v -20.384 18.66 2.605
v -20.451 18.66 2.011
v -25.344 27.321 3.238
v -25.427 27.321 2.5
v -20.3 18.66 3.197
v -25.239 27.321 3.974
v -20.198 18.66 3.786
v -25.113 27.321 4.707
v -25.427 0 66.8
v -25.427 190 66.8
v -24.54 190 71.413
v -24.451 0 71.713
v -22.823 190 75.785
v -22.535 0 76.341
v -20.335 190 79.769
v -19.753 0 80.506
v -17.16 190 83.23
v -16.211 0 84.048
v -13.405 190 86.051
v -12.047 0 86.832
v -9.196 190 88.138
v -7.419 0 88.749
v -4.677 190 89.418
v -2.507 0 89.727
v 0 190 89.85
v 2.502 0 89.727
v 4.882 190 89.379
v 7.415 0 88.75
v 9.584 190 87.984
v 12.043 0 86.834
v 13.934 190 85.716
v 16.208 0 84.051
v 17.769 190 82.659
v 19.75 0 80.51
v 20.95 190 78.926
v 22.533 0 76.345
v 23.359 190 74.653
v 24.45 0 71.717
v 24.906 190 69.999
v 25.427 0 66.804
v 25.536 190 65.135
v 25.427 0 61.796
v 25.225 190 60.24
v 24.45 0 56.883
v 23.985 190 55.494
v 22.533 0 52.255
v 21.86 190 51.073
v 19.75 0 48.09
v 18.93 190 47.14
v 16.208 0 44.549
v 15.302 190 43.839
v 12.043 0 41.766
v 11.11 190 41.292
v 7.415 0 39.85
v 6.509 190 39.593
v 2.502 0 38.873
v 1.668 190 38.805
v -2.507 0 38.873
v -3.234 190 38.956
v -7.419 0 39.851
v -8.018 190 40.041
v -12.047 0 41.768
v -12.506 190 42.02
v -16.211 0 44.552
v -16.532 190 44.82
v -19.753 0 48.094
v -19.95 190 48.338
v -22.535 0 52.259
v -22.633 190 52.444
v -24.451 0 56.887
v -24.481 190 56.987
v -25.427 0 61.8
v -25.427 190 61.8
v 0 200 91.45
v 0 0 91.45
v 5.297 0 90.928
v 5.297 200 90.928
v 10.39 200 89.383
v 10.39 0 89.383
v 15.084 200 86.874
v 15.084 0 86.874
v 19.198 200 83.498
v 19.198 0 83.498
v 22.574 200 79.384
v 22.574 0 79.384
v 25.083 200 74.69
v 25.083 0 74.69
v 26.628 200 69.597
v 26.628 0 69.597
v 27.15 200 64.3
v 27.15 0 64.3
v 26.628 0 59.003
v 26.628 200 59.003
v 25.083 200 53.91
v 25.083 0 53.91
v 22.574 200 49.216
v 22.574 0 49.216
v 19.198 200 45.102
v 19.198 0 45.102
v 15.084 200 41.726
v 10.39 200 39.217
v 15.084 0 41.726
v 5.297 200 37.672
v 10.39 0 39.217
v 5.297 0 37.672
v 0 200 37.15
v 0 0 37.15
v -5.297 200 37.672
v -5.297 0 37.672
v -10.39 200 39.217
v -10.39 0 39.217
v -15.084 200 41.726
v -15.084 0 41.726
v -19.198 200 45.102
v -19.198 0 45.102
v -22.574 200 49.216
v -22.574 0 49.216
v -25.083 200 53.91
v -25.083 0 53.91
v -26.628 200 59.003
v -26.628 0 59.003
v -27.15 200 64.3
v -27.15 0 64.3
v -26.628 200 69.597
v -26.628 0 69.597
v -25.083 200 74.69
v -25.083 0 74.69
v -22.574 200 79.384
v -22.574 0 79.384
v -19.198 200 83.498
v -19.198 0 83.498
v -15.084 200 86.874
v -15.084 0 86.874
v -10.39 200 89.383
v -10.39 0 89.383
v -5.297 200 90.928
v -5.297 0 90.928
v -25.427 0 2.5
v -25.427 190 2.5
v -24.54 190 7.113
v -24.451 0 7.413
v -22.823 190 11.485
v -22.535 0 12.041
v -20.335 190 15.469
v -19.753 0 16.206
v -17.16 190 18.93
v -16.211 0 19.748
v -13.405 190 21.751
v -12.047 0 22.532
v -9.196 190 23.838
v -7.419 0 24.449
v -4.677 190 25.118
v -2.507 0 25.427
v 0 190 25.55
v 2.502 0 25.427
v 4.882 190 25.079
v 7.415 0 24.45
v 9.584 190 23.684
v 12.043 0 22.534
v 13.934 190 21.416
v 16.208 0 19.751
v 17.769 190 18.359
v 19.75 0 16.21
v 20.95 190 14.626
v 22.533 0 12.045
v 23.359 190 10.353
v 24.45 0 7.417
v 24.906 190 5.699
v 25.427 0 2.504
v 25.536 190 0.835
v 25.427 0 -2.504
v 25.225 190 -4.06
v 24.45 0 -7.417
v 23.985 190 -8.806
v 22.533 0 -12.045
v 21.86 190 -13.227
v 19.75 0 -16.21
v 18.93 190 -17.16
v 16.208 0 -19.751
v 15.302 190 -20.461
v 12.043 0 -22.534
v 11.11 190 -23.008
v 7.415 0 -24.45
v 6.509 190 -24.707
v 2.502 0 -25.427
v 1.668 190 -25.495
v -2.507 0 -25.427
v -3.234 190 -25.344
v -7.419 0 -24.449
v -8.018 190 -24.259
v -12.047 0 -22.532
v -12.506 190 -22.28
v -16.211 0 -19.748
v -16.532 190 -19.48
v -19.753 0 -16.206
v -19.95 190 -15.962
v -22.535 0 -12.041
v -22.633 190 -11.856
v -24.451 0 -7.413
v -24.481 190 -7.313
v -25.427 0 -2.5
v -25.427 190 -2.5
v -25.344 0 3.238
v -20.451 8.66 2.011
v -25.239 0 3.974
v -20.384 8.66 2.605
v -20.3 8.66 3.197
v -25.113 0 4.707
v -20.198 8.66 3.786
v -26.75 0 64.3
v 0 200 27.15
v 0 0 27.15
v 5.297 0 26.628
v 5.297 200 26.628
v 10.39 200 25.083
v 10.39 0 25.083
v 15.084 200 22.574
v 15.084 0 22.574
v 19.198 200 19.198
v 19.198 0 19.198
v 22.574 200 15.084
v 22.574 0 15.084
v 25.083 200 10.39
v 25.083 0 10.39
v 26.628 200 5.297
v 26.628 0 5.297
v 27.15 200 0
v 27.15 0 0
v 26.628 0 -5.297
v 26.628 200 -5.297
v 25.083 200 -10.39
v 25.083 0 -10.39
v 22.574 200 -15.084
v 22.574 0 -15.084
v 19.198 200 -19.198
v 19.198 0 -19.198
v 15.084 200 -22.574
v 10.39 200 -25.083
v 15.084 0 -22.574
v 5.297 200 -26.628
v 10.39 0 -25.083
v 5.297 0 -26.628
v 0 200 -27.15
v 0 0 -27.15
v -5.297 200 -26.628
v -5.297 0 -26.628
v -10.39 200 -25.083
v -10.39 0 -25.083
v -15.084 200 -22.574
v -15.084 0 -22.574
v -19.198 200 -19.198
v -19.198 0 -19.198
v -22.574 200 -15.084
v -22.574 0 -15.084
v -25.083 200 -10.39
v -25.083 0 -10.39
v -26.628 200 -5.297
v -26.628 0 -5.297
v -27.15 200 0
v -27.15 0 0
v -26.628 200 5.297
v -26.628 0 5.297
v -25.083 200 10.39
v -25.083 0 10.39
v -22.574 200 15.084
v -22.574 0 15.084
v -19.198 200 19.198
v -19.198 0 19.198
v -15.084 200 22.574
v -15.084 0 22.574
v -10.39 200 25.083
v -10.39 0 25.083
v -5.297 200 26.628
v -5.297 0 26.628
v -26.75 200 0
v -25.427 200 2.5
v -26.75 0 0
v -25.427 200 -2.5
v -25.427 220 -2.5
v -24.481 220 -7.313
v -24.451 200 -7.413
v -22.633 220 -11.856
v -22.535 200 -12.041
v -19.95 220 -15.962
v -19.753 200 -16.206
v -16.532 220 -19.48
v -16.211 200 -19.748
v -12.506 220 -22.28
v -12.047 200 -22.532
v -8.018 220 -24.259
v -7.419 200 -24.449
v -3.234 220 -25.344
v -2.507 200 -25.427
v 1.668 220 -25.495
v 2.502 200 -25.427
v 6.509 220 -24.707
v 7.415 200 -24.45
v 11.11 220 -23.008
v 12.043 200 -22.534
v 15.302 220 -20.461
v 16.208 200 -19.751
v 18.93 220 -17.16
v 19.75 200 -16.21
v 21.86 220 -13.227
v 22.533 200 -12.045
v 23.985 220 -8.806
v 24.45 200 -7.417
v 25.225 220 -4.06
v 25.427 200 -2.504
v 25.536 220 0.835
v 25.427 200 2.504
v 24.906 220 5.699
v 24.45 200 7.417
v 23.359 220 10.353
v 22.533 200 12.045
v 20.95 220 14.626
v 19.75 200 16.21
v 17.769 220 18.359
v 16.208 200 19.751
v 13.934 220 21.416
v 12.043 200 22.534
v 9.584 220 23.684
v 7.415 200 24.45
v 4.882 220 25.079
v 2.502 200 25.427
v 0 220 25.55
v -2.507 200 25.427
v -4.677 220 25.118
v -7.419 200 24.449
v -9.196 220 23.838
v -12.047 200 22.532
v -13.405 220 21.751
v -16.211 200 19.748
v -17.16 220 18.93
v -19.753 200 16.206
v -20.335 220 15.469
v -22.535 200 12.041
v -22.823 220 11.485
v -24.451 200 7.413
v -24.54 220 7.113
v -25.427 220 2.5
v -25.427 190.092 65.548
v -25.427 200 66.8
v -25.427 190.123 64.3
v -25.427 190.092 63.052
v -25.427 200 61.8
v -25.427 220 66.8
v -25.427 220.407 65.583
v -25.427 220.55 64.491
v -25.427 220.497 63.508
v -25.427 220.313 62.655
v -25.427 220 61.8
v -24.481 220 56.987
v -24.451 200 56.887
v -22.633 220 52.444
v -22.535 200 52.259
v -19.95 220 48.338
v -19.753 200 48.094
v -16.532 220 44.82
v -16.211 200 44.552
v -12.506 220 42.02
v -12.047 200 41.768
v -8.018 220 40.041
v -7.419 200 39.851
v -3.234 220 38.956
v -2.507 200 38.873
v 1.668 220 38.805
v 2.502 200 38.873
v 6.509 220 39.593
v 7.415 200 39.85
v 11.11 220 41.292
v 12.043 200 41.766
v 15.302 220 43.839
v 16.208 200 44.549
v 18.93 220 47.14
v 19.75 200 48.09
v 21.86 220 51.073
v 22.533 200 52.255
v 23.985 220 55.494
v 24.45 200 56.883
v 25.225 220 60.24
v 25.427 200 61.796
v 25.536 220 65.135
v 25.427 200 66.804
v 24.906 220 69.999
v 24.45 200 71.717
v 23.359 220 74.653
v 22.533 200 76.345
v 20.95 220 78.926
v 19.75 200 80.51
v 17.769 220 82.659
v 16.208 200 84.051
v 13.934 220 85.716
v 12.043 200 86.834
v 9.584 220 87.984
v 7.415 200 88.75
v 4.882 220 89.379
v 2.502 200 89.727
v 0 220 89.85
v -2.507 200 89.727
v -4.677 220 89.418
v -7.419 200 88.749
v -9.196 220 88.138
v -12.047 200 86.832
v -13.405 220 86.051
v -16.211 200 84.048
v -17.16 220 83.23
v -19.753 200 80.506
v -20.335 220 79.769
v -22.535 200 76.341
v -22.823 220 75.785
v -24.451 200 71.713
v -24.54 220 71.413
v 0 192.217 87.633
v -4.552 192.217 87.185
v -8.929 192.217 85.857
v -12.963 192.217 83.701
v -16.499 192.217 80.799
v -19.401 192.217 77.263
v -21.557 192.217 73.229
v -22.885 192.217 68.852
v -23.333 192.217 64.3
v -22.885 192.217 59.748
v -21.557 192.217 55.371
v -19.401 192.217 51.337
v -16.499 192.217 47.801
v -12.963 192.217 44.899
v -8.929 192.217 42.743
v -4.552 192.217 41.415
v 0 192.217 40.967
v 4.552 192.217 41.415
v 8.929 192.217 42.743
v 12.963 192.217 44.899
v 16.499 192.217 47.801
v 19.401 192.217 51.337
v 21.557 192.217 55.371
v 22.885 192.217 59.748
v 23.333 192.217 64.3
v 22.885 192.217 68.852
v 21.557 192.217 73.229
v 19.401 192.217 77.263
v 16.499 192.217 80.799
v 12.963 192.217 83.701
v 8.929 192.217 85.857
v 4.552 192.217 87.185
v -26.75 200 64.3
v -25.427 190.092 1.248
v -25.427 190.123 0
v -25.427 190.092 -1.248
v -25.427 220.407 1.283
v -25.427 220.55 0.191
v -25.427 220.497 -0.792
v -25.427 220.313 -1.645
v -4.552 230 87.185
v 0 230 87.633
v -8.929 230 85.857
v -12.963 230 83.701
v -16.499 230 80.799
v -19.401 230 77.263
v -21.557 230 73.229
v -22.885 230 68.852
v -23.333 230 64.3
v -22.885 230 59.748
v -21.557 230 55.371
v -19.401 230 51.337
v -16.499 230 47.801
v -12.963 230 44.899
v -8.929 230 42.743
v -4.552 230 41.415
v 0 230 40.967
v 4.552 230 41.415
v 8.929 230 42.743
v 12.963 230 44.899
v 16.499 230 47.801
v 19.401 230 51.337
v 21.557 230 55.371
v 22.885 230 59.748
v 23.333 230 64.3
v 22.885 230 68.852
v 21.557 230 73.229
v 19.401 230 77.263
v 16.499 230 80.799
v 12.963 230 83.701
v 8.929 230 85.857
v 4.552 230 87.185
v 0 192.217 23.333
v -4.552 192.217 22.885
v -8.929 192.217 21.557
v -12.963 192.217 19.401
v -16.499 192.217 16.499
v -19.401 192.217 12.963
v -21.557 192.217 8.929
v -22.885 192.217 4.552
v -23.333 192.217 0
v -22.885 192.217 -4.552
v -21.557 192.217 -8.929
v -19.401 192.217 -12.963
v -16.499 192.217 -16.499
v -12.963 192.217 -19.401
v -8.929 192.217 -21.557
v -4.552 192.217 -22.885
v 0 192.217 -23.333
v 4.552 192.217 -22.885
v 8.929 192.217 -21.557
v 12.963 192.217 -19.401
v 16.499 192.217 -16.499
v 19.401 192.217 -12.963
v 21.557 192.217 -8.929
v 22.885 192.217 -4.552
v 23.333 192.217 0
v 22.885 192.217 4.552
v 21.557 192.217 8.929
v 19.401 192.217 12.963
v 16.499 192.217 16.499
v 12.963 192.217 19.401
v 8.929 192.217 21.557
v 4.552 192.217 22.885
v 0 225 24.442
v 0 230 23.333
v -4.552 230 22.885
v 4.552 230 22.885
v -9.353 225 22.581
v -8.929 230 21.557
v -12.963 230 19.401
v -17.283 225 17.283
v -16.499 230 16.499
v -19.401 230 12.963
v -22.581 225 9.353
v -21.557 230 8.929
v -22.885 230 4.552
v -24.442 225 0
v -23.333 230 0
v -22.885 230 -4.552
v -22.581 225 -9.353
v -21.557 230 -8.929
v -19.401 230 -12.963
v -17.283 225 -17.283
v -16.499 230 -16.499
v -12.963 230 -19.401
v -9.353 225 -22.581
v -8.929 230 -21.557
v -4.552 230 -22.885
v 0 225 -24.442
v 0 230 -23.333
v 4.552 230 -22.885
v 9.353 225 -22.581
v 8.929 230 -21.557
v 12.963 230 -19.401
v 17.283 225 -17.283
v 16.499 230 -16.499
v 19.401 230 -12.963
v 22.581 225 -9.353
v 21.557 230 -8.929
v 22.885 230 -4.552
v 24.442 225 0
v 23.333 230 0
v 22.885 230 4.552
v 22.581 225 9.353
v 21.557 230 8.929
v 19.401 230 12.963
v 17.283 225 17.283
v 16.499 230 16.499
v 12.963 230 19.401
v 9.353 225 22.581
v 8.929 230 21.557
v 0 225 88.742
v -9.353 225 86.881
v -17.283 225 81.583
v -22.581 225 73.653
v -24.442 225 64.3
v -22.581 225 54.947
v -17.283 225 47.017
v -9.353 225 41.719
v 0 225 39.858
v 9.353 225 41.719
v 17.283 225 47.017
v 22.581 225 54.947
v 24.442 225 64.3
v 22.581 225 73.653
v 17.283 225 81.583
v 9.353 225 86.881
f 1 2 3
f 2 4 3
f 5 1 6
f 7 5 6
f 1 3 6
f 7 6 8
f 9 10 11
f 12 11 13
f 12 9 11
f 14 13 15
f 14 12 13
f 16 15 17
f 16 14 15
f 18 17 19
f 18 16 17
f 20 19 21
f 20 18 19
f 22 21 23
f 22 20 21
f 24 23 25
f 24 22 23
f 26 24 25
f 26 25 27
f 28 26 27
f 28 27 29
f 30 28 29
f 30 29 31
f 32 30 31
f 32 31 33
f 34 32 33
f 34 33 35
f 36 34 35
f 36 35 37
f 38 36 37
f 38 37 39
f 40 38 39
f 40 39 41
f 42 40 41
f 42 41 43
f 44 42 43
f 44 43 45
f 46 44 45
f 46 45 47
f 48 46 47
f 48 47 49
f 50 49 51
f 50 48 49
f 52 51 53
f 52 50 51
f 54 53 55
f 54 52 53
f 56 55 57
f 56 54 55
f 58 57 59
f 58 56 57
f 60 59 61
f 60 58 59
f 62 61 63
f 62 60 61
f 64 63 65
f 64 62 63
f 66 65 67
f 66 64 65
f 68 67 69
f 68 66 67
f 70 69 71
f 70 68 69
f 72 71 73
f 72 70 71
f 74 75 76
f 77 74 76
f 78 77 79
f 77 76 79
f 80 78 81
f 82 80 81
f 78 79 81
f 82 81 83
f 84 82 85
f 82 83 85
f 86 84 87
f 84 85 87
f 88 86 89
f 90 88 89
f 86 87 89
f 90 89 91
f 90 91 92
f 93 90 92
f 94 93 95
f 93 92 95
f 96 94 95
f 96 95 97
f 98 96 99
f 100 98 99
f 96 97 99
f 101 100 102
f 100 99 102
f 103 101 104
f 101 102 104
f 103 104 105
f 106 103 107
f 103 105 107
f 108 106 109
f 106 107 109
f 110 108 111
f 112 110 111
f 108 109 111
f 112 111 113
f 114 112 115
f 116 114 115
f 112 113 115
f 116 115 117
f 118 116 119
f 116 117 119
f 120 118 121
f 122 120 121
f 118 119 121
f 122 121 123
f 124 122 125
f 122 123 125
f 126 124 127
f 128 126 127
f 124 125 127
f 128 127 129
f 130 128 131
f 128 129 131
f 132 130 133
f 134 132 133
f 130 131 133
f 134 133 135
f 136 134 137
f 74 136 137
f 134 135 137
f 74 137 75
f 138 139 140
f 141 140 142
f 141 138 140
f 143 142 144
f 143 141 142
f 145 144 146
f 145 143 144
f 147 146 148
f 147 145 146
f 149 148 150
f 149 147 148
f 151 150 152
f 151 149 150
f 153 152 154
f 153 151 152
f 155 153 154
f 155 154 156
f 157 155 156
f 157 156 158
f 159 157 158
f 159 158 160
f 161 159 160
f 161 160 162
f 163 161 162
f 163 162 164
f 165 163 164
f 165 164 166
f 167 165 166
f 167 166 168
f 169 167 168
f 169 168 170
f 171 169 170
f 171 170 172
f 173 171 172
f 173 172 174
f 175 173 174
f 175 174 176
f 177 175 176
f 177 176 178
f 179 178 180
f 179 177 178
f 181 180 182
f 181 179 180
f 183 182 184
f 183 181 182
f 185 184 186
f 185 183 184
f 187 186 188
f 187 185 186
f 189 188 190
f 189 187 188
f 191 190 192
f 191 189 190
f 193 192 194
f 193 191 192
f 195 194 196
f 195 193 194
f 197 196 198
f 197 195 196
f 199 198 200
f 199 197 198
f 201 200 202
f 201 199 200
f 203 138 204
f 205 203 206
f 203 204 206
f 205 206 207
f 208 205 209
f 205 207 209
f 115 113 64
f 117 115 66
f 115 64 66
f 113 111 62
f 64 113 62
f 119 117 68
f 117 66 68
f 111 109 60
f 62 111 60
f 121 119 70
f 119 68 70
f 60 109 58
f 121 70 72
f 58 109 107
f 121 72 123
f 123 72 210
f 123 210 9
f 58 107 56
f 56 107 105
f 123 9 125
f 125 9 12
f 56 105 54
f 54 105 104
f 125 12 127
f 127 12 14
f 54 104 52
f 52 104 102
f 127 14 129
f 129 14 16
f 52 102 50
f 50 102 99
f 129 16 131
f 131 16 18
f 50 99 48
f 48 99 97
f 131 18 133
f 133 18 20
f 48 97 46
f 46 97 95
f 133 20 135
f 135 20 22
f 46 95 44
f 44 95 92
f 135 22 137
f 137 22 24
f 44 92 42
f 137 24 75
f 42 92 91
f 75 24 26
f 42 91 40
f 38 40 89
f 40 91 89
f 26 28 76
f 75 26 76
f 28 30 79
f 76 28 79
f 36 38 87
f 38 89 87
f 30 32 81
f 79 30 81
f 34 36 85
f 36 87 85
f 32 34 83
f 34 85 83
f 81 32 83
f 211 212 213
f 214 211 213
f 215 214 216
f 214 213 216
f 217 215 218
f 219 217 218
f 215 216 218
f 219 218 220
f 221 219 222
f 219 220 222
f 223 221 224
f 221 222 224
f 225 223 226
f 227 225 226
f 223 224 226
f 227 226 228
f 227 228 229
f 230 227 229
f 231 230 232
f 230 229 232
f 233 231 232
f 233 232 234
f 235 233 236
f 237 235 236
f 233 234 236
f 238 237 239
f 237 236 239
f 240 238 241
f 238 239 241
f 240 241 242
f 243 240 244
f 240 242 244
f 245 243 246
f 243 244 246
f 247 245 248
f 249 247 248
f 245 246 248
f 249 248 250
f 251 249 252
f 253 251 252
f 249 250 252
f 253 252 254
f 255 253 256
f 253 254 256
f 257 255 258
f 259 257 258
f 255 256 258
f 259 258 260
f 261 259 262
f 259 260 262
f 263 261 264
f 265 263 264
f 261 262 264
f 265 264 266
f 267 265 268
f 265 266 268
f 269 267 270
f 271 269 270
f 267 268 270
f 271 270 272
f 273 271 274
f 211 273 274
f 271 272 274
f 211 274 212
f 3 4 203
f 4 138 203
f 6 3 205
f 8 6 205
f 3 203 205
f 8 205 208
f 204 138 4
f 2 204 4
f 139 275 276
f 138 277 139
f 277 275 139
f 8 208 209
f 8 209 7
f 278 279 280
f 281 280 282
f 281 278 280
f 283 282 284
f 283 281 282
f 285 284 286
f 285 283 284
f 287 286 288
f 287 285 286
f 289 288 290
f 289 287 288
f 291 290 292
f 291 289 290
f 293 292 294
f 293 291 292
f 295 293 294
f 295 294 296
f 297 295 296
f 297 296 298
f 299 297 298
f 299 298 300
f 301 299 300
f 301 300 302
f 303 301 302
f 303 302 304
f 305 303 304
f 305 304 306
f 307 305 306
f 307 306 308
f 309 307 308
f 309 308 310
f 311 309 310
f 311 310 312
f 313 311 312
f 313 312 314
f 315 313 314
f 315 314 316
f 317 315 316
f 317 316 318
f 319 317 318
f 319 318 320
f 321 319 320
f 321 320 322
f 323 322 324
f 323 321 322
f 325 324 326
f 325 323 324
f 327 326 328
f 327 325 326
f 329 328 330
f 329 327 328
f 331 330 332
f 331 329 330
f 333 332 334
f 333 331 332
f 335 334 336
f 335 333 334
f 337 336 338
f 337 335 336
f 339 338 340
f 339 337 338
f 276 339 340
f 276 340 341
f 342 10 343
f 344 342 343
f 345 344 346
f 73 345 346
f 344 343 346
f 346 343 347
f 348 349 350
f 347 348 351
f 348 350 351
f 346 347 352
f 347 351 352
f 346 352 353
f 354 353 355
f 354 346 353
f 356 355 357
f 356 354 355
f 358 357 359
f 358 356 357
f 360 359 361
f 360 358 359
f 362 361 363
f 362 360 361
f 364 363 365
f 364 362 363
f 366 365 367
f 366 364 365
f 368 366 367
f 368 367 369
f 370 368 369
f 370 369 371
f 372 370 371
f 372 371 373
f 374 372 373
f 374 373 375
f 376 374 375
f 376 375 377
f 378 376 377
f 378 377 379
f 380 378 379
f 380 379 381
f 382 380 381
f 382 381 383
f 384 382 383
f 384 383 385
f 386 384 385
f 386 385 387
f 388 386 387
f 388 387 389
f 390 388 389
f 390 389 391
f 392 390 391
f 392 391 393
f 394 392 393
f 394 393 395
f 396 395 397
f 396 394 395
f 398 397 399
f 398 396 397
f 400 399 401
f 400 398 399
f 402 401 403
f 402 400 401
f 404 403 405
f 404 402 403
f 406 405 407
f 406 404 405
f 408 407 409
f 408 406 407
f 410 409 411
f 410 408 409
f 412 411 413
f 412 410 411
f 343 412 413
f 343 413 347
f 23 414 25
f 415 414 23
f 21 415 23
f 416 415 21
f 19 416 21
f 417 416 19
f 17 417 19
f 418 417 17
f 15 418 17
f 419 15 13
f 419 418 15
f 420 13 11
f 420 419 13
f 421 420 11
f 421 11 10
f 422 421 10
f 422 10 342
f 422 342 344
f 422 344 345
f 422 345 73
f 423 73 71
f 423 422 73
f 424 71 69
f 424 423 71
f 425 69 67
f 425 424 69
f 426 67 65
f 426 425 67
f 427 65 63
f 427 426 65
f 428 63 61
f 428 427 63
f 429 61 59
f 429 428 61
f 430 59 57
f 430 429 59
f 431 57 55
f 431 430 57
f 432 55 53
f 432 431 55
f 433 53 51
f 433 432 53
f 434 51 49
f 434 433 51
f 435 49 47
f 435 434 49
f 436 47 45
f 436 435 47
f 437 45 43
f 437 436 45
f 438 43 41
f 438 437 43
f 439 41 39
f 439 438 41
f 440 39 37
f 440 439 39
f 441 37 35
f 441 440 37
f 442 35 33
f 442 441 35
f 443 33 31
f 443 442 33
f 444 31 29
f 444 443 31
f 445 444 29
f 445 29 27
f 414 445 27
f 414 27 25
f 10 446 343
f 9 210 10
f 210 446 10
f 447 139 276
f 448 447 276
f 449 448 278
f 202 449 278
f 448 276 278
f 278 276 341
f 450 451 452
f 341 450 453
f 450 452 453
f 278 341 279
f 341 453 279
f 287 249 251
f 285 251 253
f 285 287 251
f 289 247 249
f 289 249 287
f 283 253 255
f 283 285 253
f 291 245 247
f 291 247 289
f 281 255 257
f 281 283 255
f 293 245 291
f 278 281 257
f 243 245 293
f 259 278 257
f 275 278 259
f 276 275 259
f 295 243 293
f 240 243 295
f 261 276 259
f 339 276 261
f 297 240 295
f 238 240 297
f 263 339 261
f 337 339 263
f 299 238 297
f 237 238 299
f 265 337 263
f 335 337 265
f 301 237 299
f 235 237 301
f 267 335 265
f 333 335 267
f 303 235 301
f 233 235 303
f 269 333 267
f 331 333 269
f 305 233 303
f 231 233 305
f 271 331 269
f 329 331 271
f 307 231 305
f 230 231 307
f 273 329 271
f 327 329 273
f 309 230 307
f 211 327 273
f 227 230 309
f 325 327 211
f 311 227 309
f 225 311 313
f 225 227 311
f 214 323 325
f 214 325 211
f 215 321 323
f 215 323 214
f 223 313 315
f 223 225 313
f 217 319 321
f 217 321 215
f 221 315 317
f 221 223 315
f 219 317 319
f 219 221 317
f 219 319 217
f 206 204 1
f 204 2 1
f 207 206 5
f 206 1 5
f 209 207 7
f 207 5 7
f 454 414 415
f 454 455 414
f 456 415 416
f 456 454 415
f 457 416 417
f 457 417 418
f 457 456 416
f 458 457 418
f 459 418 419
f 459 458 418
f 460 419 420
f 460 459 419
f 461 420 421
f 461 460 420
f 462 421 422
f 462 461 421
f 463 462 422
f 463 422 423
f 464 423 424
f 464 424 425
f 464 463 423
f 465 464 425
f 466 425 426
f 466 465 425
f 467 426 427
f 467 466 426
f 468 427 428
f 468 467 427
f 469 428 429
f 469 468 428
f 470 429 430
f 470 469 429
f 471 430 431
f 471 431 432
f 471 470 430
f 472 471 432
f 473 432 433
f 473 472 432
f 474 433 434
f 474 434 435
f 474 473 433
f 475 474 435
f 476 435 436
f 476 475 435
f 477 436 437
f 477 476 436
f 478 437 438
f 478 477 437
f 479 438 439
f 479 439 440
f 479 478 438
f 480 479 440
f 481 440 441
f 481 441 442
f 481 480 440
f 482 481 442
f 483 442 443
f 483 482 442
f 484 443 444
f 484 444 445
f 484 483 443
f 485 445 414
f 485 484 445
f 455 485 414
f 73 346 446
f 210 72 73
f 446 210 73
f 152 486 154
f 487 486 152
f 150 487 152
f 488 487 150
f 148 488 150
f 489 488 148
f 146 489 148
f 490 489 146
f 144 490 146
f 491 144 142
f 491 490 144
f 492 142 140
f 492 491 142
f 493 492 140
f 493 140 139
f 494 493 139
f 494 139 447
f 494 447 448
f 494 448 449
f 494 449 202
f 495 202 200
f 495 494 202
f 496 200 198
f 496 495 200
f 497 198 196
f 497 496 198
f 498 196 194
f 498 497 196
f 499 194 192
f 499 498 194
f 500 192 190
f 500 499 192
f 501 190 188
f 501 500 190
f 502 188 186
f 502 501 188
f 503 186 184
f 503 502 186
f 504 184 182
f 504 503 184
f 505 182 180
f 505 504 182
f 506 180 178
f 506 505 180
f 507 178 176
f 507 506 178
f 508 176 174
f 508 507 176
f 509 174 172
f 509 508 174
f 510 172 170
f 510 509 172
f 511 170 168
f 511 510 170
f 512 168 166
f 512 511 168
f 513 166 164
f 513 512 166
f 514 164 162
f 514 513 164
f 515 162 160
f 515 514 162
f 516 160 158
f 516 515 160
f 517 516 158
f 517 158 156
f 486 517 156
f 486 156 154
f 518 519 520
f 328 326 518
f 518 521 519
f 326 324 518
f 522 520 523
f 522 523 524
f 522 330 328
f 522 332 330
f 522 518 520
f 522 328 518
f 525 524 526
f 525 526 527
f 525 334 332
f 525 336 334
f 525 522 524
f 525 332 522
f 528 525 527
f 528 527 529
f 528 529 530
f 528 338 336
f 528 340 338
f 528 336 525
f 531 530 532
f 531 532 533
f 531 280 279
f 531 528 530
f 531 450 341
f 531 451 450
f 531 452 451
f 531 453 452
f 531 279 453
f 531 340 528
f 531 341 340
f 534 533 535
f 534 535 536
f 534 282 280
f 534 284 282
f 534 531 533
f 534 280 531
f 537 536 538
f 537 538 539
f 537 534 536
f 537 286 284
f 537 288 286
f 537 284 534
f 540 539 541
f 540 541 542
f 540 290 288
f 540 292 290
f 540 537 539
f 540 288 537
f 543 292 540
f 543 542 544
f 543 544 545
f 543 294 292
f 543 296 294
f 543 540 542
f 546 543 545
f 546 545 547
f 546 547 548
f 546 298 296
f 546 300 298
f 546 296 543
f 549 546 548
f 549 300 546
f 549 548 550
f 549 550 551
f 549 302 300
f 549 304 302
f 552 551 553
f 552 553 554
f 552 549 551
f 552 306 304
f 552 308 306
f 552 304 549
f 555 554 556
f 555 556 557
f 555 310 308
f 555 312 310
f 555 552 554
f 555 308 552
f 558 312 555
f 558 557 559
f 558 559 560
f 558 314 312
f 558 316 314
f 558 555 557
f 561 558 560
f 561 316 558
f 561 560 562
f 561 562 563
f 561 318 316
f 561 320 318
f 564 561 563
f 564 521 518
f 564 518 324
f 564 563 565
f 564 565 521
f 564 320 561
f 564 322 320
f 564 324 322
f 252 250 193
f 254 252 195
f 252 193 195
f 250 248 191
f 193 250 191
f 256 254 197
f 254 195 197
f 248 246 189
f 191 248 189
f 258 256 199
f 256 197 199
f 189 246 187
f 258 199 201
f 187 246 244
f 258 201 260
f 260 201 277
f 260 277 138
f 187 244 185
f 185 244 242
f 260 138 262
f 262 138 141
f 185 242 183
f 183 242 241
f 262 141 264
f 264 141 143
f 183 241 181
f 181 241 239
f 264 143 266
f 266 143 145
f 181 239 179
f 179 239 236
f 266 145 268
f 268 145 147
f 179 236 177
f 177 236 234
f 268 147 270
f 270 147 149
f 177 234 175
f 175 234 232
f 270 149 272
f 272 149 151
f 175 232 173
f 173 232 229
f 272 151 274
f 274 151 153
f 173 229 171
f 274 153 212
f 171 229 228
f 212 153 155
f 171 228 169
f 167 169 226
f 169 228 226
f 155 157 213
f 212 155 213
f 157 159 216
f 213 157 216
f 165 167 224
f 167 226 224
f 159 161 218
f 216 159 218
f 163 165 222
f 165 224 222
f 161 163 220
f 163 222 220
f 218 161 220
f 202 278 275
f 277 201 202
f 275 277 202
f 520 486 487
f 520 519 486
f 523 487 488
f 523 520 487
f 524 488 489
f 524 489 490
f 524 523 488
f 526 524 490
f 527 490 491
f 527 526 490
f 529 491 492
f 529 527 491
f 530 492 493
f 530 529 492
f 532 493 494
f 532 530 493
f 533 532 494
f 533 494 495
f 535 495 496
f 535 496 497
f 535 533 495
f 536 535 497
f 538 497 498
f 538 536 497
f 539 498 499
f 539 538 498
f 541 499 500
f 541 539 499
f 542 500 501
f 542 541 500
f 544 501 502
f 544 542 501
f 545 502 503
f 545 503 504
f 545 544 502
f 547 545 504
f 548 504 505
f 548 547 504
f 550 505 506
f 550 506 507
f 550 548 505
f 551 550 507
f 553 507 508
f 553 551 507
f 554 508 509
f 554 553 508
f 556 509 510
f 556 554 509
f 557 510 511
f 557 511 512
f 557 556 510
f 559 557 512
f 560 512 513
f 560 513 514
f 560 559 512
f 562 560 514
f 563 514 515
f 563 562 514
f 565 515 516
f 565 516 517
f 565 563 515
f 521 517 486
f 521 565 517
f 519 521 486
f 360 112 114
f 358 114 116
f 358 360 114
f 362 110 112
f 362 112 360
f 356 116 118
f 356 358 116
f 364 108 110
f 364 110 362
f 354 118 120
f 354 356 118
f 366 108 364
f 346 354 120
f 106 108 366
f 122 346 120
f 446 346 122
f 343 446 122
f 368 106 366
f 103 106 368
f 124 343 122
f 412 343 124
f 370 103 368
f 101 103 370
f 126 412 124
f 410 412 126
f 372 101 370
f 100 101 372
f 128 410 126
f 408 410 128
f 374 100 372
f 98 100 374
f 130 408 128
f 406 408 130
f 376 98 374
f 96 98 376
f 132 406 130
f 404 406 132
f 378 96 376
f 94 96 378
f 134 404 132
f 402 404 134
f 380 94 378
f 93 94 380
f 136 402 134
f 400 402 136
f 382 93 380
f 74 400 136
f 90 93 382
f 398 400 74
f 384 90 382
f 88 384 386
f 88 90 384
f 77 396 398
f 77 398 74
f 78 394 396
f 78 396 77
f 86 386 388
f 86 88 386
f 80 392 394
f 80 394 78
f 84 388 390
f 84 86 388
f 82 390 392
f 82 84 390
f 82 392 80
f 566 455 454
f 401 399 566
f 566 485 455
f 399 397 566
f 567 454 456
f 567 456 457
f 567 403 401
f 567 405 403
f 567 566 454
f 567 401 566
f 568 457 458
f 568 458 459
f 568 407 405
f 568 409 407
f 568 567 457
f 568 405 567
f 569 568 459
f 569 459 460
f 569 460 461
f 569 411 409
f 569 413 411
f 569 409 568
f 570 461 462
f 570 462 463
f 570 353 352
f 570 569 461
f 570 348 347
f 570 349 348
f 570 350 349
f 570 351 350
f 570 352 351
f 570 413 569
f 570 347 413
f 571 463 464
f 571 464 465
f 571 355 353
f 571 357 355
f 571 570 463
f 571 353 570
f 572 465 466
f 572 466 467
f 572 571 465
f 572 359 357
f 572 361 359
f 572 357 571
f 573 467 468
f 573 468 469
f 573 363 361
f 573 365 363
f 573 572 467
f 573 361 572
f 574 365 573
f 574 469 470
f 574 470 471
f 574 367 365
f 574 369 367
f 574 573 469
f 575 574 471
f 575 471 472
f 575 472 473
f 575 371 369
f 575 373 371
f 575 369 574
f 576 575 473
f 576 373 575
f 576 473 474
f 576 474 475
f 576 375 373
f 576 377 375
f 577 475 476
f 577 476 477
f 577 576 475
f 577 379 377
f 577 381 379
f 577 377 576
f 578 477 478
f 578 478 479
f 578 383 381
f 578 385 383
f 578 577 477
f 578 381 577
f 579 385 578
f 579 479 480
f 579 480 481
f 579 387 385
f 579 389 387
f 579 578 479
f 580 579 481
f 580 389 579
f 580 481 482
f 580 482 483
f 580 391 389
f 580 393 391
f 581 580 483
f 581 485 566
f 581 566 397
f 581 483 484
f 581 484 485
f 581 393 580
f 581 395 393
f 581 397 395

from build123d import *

# Parameters (mm, degrees)
SKETCH1_R               = 27.15
MANDREL_DEPTH           = 200
TAB_ANGLE               = 5
CUT_EXTRUDE1_DEPTH      = 234.182857432
CUT_EXTRUDE1_DEPTH_BACK = 234.182857432
LPATTERN1_COUNT         = 2
LPATTERN1_PITCH         = 64.3


with BuildPart() as part:
    # Sketch1 → mandrel (new body)
    with BuildSketch(Plane(origin=(0, 0, 0), x_dir=(1, 0, 0), z_dir=(0, 1, 0))):
        Circle(SKETCH1_R)
        with BuildLine():
            Line((-26.75, 0), (-25.427396642, 2.5))
            ThreePointArc((-25.427396642, 2.5), (25.55, 0), (-25.427396642, -2.5))
            Line((-25.427396642, -2.5), (-26.75, 0))
        make_face(mode=Mode.SUBTRACT)
    extrude(amount=MANDREL_DEPTH)

    # Sketch4 → coupler (revolve)
    with BuildSketch(Plane(origin=(0, 0, 0), x_dir=(-1, 0, 0), z_dir=(0, 0, -1))):
        Polygon((-23.333053374, 192.216946626), (-23.333053374, 230), (-25.55, 220), (-25.55, 190), align=None)
    revolve(axis=Axis((0, 200, 0), (0, -1, 0)))

    # Sketch5 → Cut-Extrude1 (cut, two sides: drawn at the far end of the back side and taken through both)
    with BuildSketch(Plane.XZ.offset(-CUT_EXTRUDE1_DEPTH_BACK)):
        Polygon((-25.427396642, 2.5), (-26.75, 0), (-25.427396642, -2.5), align=None)
    extrude(amount=CUT_EXTRUDE1_DEPTH + CUT_EXTRUDE1_DEPTH_BACK, mode=Mode.SUBTRACT)


with BuildPart() as body_2:
    # Sketch3 → tab (revolve)
    with BuildSketch(Plane(origin=(0, 0, 0), x_dir=(-0.9952014341371682, 0, 0.0978473581213308), z_dir=(-0.0978473581213308, 0, -0.9952014341371682))):
        Polygon((25.55, 0), (20.55, 8.660254038), (20.55, 18.660254038), (25.55, 27.320508076), align=None)
    revolve(axis=Axis((0, 200, 0), (0, 1, 0)), revolution_arc=TAB_ANGLE)


with BuildPart() as lpattern1_1:
    # LPattern1: pattern copy
    add(part.part.moved(Location(Vector(0, 0, 1) * (1 * LPATTERN1_PITCH))))


solid = Compound([part.part, body_2.part, lpattern1_1.part])
